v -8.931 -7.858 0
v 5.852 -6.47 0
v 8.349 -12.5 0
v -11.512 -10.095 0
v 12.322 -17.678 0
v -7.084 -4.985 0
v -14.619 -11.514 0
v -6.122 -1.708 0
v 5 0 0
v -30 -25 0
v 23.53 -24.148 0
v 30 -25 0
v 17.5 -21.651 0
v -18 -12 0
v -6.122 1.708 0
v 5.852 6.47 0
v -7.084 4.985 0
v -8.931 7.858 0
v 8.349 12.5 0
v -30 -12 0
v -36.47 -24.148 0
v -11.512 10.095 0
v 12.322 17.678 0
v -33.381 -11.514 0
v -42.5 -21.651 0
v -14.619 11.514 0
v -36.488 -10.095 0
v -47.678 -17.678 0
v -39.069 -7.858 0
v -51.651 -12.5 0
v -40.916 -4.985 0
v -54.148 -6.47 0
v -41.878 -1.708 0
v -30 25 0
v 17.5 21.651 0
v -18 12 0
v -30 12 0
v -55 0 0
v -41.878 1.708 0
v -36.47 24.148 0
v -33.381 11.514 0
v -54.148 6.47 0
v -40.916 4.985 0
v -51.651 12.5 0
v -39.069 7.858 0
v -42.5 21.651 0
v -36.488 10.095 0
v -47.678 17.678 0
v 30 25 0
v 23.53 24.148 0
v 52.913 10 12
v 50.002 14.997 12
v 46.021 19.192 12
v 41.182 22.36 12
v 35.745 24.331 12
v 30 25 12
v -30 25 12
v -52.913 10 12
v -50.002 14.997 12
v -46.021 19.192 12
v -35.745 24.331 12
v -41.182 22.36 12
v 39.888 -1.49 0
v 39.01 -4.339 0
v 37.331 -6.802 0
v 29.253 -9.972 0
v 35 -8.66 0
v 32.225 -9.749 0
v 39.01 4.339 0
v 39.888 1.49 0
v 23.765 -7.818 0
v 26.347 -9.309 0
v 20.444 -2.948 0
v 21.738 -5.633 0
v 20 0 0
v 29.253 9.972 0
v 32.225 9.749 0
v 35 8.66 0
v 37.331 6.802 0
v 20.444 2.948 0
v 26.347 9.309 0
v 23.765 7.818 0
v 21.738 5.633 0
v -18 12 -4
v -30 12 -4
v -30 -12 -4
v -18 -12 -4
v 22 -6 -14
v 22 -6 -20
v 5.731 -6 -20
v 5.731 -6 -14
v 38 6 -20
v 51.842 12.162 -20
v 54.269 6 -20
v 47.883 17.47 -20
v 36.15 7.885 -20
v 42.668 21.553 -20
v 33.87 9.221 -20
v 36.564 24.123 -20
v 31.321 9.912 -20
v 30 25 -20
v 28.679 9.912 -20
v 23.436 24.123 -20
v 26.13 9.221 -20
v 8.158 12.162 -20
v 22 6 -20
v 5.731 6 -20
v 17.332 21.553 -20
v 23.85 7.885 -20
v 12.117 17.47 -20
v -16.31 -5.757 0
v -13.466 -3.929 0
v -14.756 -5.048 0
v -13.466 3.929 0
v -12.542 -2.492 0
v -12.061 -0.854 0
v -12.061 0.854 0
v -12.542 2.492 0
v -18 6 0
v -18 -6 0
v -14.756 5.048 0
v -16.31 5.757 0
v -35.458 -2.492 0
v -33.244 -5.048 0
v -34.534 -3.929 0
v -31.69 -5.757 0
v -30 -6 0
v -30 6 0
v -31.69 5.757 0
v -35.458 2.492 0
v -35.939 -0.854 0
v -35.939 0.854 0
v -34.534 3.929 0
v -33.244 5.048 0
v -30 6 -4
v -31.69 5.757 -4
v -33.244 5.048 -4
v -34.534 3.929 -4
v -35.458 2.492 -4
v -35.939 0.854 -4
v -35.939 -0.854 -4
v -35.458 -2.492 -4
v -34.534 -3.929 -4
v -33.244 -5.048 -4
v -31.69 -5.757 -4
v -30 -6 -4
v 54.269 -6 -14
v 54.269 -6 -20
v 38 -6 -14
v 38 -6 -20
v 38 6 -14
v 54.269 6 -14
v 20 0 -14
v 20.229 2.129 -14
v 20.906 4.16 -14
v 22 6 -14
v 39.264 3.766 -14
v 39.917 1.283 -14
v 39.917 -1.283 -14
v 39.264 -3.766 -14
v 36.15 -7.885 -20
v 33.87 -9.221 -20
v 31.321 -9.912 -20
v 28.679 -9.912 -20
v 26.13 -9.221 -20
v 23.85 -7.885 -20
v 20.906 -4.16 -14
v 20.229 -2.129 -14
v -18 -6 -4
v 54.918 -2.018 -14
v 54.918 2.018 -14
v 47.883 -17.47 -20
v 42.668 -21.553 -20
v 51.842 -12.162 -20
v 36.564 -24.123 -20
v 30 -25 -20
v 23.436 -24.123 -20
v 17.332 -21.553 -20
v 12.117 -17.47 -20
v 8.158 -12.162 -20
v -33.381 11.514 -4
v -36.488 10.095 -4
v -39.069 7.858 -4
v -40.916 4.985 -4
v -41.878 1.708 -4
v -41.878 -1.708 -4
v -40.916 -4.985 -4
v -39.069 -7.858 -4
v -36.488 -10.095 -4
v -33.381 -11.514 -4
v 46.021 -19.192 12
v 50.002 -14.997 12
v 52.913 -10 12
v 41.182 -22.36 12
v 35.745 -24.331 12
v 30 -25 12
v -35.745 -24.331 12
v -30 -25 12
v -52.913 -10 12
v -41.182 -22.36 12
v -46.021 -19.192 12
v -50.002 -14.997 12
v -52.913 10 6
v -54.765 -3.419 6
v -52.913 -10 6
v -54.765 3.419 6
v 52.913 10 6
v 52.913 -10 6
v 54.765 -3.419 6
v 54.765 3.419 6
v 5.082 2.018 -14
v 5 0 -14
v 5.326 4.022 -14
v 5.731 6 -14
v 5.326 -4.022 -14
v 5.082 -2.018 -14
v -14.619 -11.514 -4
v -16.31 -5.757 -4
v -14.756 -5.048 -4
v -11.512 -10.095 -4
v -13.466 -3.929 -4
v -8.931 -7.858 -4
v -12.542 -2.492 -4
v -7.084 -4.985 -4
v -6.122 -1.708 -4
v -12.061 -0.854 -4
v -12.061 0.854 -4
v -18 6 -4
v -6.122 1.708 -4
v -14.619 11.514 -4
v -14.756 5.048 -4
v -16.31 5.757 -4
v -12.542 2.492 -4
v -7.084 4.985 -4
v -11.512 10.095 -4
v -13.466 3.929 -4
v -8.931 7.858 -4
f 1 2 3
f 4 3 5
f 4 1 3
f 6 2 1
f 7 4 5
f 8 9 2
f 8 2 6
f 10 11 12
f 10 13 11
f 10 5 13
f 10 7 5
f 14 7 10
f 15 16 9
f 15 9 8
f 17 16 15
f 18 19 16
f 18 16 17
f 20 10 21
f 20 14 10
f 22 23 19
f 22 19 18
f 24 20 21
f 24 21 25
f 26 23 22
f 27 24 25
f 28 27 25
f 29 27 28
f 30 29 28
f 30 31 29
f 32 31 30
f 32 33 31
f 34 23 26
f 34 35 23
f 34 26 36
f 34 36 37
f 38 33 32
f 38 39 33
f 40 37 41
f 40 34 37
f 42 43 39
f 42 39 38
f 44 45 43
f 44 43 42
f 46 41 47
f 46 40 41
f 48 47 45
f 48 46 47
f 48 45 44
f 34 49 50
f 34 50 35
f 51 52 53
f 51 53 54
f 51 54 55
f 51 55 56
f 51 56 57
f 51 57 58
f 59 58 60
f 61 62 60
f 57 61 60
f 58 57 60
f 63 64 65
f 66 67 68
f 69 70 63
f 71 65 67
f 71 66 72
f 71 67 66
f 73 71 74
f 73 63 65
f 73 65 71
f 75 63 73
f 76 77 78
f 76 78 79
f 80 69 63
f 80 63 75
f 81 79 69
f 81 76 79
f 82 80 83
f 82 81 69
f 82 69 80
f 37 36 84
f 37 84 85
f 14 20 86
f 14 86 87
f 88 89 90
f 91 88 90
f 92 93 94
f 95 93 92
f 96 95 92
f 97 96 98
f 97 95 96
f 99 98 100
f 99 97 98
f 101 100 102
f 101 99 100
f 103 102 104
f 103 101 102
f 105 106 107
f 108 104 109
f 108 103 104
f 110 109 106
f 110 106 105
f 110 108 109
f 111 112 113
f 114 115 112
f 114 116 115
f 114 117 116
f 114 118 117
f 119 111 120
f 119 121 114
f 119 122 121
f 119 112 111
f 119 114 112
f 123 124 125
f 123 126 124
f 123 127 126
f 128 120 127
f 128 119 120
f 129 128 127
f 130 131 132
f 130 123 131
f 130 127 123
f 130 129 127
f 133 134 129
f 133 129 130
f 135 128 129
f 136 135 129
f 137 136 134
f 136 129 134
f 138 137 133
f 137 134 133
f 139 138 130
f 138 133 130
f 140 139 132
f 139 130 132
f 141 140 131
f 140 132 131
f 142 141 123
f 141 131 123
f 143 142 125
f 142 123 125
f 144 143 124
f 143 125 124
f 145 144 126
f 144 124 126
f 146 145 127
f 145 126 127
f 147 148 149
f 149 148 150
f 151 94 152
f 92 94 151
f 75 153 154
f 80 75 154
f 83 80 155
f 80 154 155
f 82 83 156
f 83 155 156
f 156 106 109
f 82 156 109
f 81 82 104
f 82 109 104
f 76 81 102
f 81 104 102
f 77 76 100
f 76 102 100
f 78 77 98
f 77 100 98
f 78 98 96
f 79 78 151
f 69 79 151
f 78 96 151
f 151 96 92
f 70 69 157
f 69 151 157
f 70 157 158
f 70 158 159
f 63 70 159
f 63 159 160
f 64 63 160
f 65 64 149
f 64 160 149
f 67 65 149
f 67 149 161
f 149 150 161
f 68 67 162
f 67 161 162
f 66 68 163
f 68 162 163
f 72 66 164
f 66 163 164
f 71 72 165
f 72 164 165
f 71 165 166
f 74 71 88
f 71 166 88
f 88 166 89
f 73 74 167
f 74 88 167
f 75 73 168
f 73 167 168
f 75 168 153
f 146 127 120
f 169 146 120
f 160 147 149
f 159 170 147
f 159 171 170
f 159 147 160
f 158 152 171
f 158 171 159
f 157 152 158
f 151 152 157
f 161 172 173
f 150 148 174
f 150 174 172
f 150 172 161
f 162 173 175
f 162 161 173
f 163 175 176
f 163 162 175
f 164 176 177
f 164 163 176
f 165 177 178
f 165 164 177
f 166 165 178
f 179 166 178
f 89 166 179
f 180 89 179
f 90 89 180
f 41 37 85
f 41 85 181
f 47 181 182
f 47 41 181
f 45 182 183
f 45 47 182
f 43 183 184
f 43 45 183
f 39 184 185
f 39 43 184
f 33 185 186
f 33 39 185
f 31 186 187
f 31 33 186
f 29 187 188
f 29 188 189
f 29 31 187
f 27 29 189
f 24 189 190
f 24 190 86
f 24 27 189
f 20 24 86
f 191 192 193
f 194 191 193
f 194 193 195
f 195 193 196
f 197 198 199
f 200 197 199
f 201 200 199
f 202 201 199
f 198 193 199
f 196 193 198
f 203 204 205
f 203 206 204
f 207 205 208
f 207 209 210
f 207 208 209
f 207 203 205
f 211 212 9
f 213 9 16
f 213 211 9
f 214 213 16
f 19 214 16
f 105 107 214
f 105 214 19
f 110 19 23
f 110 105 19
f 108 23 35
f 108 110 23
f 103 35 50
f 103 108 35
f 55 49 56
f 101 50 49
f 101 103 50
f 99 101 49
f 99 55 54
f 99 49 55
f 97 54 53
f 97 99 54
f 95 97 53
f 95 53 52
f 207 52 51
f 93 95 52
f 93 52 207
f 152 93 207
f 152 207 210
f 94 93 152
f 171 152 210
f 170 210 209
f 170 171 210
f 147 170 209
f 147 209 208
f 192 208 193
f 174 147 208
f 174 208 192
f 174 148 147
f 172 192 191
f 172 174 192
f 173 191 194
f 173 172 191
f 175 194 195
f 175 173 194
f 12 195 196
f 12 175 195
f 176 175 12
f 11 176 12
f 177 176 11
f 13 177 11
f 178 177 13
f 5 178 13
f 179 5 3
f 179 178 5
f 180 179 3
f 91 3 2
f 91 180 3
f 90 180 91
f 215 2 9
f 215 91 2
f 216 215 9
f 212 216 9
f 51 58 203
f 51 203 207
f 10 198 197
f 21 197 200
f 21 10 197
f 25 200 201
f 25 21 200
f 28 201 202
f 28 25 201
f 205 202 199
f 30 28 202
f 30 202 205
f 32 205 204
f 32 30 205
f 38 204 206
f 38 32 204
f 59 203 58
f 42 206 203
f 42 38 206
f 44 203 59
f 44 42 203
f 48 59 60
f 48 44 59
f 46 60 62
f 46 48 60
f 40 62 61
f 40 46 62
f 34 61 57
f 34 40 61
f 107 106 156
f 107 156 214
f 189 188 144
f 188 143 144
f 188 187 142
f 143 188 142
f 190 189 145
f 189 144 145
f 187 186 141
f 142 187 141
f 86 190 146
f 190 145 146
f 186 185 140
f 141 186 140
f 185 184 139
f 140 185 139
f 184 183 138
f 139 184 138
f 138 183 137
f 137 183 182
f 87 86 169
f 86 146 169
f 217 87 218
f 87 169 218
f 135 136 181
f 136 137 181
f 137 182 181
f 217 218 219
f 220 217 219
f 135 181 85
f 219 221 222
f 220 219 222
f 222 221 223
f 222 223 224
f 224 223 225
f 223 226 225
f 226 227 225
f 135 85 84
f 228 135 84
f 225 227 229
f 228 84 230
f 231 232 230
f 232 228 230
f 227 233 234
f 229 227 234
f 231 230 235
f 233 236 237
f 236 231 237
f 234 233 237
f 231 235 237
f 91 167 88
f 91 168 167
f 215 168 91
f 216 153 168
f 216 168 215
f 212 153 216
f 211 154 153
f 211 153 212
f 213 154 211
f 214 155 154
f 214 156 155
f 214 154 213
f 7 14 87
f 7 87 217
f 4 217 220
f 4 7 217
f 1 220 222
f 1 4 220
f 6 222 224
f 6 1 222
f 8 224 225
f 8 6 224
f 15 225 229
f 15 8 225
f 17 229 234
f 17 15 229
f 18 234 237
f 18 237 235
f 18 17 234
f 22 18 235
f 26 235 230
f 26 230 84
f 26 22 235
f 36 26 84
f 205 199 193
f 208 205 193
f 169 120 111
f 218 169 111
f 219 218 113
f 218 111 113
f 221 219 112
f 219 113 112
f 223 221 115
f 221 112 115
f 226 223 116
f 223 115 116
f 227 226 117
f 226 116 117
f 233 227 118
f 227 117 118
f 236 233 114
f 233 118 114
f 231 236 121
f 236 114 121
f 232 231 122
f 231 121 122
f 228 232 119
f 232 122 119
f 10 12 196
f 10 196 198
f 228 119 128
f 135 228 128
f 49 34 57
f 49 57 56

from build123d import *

# Parameters (mm, degrees)
BOSS_EXTRUDE1_DEPTH = 12
SKETCH2_W           = 115.368929346
SKETCH2_H           = 20
CUT_EXTRUDE1_DEPTH  = 6
BOSS_EXTRUDE2_START = 20
SKETCH3_R           = 25
SKETCH3_R_2         = 10
BOSS_EXTRUDE2_DEPTH = 20
SKETCH4_W           = 50
SKETCH4_H           = 12
CUT_EXTRUDE2_DEPTH  = 6
BOSS_EXTRUDE3_DEPTH = 4


with BuildPart() as part:
    # Sketch1 → Boss-Extrude1 (new body)
    with BuildSketch(Plane.XY):
        with BuildLine():
            Line((30, -25), (-30, -25))
            ThreePointArc((-30, -25), (-55, 0), (-30, 25))
            Line((-30, 25), (30, 25))
            ThreePointArc((30, 25), (55, 0), (30, -25))
        make_face()
    extrude(amount=BOSS_EXTRUDE1_DEPTH)

    # Sketch2 → Cut-Extrude1 (cut)
    with BuildSketch(Plane.XY.offset(12)):
        Rectangle(SKETCH2_W, SKETCH2_H)
    extrude(amount=-CUT_EXTRUDE1_DEPTH, mode=Mode.SUBTRACT)

    # Sketch3 → Boss-Extrude2 (add)
    with BuildSketch(Plane(origin=(0, 0, 0), x_dir=(-1, 0, 0), z_dir=(0, 0, -1)).offset(BOSS_EXTRUDE2_START)):
        with Locations((-30, 0)):
            Circle(SKETCH3_R)
        with Locations((-30, 0)):
            Circle(SKETCH3_R_2, mode=Mode.SUBTRACT)
    extrude(amount=-BOSS_EXTRUDE2_DEPTH)

    # Sketch4 → Cut-Extrude2 (cut)
    with BuildSketch(Plane(origin=(0, 0, -20), x_dir=(-1, 0, 0), z_dir=(0, 0, -1))):
        with Locations((-30, 0)):
            Rectangle(SKETCH4_W, SKETCH4_H)
    extrude(amount=-CUT_EXTRUDE2_DEPTH, mode=Mode.SUBTRACT)

    # Sketch5 → Boss-Extrude3 (add)
    with BuildSketch(Plane(origin=(0, 0, 0), x_dir=(-1, 0, 0), z_dir=(0, 0, -1))):
        with BuildLine():
            Line((18, 12), (30, 12))
            ThreePointArc((30, 12), (42, 0), (30, -12))
            Line((30, -12), (18, -12))
            ThreePointArc((18, -12), (6, 0), (18, 12))
        make_face()
        with BuildLine():
            Line((18, 6), (30, 6))
            ThreePointArc((30, 6), (36, 0), (30, -6))
            Line((30, -6), (18, -6))
            ThreePointArc((18, -6), (12, 0), (18, 6))
        make_face(mode=Mode.SUBTRACT)
    extrude(amount=BOSS_EXTRUDE3_DEPTH)


solid = part.part
